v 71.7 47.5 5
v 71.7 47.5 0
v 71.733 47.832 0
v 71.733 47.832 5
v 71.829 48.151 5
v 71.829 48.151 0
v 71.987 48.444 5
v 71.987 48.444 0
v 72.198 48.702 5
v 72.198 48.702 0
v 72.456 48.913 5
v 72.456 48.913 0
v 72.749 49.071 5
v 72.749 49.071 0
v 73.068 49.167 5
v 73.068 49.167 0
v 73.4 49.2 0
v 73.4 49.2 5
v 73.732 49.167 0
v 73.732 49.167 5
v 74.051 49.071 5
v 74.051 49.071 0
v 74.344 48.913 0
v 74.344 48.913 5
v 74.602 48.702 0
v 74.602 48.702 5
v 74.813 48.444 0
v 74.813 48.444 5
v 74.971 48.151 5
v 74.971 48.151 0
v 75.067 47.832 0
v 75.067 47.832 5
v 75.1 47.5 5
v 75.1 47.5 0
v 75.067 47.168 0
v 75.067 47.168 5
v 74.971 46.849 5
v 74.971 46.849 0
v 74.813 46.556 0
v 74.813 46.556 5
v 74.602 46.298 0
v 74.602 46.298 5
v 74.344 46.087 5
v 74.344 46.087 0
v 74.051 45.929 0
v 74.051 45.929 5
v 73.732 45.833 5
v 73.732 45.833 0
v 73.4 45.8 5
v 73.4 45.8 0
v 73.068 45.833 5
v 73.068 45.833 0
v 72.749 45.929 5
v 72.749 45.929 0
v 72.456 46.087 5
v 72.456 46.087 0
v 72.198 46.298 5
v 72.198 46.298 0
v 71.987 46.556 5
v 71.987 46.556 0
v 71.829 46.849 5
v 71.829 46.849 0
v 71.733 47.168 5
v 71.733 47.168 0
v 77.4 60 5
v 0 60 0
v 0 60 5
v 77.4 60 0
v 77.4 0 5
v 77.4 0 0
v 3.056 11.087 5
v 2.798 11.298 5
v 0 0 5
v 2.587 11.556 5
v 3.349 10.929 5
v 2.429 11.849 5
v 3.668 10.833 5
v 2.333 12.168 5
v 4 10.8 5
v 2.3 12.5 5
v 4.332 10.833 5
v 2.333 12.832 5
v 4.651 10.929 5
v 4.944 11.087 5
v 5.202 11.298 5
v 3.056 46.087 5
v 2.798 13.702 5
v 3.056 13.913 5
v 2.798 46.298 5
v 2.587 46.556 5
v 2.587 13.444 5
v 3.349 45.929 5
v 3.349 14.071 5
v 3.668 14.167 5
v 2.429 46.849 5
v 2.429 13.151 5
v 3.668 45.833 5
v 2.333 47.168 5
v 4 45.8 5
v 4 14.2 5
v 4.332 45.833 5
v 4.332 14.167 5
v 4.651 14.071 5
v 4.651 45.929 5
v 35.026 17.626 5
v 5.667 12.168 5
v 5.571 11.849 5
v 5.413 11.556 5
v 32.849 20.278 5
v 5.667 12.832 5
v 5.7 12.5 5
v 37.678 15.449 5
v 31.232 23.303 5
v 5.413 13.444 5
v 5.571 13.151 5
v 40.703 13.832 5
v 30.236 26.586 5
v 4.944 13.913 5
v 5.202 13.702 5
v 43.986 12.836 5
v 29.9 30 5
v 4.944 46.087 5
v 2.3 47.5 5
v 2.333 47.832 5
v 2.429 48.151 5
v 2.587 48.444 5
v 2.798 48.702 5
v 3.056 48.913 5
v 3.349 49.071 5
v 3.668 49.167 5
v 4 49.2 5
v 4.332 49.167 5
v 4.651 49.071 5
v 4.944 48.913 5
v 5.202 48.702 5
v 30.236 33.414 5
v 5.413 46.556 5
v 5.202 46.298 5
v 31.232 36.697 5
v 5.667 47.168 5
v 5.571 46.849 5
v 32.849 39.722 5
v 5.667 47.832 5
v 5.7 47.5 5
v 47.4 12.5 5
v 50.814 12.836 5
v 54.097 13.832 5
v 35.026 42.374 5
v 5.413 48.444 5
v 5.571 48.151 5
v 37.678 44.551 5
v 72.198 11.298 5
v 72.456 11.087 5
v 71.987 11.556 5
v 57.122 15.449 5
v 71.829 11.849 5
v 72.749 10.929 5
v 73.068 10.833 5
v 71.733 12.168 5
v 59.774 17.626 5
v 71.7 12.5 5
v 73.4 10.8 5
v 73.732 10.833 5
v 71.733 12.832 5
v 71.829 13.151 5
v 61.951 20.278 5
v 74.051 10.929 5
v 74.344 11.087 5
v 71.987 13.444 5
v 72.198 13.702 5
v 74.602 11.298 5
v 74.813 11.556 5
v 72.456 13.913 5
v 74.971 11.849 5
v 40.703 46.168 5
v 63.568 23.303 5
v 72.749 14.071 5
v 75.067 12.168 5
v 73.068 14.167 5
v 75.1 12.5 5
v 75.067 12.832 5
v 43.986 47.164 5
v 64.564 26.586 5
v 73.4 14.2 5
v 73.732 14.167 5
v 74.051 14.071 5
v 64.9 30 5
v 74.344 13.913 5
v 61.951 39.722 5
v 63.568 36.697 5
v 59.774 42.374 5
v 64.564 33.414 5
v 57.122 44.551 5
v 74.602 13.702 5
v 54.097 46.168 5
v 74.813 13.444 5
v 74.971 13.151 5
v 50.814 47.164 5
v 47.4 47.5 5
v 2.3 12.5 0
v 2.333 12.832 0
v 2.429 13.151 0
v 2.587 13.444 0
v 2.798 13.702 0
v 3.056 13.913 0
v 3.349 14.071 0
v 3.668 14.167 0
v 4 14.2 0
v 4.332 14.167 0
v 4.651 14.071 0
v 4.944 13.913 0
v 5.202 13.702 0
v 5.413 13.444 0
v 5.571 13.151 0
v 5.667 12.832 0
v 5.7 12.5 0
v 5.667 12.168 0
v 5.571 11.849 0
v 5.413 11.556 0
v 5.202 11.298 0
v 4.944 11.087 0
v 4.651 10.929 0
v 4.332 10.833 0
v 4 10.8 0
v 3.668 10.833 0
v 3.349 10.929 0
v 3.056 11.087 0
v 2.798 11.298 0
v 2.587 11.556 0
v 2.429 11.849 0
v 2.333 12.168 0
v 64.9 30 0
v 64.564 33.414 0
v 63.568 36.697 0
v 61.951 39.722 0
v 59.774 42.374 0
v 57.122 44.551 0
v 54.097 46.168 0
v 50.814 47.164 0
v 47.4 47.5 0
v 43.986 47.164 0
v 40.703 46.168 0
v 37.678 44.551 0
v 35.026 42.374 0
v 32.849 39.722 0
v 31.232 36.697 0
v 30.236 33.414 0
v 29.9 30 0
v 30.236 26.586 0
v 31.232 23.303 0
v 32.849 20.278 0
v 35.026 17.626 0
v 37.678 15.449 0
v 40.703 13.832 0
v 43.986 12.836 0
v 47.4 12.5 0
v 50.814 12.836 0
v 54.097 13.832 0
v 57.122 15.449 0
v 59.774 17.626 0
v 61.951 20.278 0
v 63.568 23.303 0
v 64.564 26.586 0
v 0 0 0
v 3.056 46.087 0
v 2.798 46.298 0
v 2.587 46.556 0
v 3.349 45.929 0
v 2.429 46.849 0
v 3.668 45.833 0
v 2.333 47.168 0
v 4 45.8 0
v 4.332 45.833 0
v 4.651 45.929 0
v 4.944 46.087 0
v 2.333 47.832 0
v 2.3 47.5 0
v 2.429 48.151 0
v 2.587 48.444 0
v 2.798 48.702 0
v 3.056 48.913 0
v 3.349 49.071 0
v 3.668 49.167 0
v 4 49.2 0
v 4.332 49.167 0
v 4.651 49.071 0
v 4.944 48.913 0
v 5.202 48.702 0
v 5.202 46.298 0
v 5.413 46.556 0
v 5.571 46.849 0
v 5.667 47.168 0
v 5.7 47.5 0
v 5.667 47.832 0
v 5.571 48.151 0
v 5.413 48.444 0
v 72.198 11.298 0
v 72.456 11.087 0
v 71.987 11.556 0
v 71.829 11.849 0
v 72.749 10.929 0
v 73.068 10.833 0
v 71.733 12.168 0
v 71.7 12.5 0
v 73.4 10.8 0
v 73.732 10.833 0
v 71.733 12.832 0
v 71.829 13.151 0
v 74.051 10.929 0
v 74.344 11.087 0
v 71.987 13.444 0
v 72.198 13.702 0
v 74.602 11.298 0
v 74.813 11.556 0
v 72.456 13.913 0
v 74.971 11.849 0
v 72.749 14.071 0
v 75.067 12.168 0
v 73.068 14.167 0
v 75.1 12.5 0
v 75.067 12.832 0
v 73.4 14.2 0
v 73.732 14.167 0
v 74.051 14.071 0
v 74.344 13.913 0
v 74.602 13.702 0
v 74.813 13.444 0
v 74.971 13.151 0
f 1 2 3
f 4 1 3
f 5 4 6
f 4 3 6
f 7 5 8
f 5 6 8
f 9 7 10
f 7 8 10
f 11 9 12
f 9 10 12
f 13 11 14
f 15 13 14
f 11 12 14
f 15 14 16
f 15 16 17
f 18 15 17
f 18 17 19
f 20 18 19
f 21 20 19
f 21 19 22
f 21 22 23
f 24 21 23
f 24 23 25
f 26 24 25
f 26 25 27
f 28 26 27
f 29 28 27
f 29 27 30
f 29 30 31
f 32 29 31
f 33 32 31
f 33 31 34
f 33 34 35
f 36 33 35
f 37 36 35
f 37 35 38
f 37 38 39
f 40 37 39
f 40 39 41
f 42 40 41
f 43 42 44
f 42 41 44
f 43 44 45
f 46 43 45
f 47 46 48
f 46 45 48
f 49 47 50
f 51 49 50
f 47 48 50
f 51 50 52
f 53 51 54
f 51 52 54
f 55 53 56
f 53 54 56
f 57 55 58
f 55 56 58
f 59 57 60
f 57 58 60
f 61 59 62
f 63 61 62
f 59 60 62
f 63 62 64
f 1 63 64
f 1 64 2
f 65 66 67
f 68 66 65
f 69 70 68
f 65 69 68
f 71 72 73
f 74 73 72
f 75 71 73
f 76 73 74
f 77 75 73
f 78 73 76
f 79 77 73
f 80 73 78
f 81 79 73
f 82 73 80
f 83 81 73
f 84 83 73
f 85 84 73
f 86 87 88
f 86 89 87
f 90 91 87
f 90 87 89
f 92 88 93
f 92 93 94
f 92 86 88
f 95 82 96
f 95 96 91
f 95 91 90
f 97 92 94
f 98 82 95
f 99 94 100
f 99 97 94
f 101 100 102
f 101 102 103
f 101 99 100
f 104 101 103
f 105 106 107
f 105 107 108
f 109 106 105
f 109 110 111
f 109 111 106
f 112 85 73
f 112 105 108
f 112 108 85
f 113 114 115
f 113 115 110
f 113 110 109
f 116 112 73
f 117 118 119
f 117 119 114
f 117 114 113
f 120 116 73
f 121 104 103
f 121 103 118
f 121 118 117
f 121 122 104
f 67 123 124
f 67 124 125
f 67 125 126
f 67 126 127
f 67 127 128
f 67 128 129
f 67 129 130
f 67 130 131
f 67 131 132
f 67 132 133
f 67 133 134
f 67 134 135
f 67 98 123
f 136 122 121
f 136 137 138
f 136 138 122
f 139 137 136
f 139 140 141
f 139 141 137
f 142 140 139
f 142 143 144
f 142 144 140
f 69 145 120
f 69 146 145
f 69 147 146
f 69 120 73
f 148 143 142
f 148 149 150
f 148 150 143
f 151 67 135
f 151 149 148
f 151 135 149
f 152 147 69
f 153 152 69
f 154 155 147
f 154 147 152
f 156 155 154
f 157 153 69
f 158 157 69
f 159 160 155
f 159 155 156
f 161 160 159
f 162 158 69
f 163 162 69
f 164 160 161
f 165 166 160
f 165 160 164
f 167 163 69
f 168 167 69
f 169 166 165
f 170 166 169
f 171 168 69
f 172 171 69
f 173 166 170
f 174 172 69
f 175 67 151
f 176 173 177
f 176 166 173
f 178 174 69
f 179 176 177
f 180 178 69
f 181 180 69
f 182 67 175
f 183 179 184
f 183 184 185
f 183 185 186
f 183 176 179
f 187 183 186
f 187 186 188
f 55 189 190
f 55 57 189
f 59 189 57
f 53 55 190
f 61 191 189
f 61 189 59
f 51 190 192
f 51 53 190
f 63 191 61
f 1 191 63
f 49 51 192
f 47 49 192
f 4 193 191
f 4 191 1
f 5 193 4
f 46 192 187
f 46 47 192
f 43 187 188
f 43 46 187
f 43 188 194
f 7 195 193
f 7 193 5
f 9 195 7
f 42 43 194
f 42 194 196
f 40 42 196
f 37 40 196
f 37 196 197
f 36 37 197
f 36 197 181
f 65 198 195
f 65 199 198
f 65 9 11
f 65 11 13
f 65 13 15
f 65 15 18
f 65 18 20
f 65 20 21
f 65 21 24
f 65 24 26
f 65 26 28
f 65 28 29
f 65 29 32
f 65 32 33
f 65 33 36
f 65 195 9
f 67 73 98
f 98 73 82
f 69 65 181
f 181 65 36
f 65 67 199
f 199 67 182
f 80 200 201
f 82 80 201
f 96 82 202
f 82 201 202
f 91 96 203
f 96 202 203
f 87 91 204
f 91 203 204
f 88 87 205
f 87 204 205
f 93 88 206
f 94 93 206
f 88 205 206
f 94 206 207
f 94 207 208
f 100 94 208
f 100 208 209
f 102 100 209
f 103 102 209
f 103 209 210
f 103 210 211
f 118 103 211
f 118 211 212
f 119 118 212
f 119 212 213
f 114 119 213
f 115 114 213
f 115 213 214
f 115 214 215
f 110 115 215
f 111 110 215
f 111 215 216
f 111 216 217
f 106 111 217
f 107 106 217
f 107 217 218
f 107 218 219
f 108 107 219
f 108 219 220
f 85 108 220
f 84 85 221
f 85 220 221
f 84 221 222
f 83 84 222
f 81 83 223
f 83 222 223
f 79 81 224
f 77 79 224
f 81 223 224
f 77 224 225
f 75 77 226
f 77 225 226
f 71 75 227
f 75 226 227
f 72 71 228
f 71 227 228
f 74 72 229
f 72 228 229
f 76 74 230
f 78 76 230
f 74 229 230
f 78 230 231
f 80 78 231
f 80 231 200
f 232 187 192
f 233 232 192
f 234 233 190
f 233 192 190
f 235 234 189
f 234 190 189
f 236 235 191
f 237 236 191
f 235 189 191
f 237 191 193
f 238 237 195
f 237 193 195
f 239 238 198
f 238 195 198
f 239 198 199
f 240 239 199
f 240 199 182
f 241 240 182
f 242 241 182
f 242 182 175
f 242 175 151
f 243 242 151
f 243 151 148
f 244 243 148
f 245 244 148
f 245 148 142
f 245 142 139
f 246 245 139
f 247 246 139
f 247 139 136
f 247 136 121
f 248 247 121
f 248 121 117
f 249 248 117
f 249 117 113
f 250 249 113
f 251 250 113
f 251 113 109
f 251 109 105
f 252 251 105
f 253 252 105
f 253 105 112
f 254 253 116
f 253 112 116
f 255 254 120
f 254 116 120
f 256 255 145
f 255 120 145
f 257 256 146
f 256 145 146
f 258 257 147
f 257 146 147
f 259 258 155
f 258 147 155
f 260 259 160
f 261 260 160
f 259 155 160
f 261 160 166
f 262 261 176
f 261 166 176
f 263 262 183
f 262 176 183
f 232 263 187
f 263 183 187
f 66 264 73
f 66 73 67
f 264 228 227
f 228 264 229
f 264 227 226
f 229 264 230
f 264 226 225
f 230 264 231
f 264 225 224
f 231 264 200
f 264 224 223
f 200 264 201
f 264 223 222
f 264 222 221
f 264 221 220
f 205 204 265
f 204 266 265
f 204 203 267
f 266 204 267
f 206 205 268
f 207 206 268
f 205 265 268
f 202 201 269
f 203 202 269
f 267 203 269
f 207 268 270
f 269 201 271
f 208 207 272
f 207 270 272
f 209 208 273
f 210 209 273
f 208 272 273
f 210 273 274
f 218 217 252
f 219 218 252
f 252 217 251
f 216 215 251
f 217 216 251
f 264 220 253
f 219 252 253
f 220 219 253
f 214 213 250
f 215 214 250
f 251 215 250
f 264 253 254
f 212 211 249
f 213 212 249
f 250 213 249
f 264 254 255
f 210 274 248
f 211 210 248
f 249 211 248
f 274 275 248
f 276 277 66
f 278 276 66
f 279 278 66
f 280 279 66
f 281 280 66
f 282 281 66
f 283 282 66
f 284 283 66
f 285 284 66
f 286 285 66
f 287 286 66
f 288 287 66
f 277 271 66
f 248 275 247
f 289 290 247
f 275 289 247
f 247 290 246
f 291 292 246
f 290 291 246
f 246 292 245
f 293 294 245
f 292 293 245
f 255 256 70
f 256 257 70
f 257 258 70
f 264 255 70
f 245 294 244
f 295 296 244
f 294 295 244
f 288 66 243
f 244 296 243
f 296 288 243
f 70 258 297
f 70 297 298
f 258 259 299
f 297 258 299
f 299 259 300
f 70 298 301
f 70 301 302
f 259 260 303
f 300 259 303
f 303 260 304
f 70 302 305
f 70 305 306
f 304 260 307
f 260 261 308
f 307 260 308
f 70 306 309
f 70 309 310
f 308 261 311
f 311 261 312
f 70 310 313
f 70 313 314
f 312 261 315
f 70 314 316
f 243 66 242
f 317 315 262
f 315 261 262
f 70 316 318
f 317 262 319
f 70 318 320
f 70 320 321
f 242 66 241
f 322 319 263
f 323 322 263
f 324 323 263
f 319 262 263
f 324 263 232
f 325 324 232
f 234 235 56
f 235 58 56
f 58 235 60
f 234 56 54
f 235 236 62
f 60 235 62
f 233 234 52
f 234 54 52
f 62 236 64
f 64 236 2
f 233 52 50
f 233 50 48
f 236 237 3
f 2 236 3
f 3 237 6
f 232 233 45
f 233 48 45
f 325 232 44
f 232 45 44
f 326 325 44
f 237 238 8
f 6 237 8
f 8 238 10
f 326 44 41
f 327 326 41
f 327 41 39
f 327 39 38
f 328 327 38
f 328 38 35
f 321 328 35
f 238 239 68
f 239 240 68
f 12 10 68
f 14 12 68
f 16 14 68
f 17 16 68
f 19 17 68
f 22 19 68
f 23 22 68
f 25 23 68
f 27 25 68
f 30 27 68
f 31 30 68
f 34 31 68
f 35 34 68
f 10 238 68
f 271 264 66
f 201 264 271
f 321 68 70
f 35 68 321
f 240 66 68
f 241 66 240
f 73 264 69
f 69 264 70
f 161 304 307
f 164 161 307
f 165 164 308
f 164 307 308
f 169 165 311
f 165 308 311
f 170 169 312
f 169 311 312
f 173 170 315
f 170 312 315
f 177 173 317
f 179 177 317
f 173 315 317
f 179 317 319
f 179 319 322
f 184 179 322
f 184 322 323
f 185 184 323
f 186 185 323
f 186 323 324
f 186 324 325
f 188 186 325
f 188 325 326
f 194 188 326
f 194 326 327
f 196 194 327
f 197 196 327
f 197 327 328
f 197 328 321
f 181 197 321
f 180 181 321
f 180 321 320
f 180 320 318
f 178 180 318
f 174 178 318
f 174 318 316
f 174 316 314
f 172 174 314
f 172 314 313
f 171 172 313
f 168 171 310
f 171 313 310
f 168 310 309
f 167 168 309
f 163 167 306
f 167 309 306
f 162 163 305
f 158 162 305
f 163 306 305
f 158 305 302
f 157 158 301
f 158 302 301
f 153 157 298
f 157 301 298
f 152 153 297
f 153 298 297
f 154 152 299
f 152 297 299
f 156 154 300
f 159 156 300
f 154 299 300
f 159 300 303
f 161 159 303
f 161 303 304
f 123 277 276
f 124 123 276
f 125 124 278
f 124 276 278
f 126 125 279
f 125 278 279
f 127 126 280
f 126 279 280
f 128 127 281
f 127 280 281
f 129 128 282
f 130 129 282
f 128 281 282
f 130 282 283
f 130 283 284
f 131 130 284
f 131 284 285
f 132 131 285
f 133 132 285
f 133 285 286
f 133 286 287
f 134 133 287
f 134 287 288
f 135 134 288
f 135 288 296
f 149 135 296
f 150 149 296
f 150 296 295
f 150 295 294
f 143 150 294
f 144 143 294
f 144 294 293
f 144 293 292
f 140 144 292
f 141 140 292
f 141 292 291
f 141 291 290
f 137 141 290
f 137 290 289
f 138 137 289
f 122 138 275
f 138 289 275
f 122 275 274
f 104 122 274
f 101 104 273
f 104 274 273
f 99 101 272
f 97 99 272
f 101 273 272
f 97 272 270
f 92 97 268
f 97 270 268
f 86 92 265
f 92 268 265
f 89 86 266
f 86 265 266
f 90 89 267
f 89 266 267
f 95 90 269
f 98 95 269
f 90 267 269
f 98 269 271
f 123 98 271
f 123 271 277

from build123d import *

# Parameters (mm, degrees)
SKETCH_1_W              = 77.4
SKETCH_1_H              = 60
EXTRUDE_1_DEPTH         = 5
SKETCH_2_R              = 17.5
CUT_EXTRUDE_1_DEPTH     = 99.059981644
HOLE_WIZARD_3_4_3_4_2_D = 3.4


with BuildPart() as part:
    # ｽｹｯﾁ1 → ﾎﾞｽ - 押し出し1 (new body)
    with BuildSketch(Plane.XY):
        with Locations((38.7, 30)):
            Rectangle(SKETCH_1_W, SKETCH_1_H)
    extrude(amount=EXTRUDE_1_DEPTH)

    # ｽｹｯﾁ2 → ｶｯﾄ - 押し出し1 (cut, through all)
    with BuildSketch(Plane.XY.offset(5)):
        with Locations((47.4, 30)):
            Circle(SKETCH_2_R)
    extrude(amount=-CUT_EXTRUDE_1_DEPTH, mode=Mode.SUBTRACT)

    # Ø3.4 (3.4) 直径の穴2 (through all)
    with Locations(Plane(origin=(73.4, 47.5, 5), x_dir=(1, 0, 0), z_dir=(0, 0, 1))):
        with Locations((0, 0), (0, -35), (-69.4, -35), (-69.4, 0)):
            Hole(HOLE_WIZARD_3_4_3_4_2_D / 2)


solid = part.part
